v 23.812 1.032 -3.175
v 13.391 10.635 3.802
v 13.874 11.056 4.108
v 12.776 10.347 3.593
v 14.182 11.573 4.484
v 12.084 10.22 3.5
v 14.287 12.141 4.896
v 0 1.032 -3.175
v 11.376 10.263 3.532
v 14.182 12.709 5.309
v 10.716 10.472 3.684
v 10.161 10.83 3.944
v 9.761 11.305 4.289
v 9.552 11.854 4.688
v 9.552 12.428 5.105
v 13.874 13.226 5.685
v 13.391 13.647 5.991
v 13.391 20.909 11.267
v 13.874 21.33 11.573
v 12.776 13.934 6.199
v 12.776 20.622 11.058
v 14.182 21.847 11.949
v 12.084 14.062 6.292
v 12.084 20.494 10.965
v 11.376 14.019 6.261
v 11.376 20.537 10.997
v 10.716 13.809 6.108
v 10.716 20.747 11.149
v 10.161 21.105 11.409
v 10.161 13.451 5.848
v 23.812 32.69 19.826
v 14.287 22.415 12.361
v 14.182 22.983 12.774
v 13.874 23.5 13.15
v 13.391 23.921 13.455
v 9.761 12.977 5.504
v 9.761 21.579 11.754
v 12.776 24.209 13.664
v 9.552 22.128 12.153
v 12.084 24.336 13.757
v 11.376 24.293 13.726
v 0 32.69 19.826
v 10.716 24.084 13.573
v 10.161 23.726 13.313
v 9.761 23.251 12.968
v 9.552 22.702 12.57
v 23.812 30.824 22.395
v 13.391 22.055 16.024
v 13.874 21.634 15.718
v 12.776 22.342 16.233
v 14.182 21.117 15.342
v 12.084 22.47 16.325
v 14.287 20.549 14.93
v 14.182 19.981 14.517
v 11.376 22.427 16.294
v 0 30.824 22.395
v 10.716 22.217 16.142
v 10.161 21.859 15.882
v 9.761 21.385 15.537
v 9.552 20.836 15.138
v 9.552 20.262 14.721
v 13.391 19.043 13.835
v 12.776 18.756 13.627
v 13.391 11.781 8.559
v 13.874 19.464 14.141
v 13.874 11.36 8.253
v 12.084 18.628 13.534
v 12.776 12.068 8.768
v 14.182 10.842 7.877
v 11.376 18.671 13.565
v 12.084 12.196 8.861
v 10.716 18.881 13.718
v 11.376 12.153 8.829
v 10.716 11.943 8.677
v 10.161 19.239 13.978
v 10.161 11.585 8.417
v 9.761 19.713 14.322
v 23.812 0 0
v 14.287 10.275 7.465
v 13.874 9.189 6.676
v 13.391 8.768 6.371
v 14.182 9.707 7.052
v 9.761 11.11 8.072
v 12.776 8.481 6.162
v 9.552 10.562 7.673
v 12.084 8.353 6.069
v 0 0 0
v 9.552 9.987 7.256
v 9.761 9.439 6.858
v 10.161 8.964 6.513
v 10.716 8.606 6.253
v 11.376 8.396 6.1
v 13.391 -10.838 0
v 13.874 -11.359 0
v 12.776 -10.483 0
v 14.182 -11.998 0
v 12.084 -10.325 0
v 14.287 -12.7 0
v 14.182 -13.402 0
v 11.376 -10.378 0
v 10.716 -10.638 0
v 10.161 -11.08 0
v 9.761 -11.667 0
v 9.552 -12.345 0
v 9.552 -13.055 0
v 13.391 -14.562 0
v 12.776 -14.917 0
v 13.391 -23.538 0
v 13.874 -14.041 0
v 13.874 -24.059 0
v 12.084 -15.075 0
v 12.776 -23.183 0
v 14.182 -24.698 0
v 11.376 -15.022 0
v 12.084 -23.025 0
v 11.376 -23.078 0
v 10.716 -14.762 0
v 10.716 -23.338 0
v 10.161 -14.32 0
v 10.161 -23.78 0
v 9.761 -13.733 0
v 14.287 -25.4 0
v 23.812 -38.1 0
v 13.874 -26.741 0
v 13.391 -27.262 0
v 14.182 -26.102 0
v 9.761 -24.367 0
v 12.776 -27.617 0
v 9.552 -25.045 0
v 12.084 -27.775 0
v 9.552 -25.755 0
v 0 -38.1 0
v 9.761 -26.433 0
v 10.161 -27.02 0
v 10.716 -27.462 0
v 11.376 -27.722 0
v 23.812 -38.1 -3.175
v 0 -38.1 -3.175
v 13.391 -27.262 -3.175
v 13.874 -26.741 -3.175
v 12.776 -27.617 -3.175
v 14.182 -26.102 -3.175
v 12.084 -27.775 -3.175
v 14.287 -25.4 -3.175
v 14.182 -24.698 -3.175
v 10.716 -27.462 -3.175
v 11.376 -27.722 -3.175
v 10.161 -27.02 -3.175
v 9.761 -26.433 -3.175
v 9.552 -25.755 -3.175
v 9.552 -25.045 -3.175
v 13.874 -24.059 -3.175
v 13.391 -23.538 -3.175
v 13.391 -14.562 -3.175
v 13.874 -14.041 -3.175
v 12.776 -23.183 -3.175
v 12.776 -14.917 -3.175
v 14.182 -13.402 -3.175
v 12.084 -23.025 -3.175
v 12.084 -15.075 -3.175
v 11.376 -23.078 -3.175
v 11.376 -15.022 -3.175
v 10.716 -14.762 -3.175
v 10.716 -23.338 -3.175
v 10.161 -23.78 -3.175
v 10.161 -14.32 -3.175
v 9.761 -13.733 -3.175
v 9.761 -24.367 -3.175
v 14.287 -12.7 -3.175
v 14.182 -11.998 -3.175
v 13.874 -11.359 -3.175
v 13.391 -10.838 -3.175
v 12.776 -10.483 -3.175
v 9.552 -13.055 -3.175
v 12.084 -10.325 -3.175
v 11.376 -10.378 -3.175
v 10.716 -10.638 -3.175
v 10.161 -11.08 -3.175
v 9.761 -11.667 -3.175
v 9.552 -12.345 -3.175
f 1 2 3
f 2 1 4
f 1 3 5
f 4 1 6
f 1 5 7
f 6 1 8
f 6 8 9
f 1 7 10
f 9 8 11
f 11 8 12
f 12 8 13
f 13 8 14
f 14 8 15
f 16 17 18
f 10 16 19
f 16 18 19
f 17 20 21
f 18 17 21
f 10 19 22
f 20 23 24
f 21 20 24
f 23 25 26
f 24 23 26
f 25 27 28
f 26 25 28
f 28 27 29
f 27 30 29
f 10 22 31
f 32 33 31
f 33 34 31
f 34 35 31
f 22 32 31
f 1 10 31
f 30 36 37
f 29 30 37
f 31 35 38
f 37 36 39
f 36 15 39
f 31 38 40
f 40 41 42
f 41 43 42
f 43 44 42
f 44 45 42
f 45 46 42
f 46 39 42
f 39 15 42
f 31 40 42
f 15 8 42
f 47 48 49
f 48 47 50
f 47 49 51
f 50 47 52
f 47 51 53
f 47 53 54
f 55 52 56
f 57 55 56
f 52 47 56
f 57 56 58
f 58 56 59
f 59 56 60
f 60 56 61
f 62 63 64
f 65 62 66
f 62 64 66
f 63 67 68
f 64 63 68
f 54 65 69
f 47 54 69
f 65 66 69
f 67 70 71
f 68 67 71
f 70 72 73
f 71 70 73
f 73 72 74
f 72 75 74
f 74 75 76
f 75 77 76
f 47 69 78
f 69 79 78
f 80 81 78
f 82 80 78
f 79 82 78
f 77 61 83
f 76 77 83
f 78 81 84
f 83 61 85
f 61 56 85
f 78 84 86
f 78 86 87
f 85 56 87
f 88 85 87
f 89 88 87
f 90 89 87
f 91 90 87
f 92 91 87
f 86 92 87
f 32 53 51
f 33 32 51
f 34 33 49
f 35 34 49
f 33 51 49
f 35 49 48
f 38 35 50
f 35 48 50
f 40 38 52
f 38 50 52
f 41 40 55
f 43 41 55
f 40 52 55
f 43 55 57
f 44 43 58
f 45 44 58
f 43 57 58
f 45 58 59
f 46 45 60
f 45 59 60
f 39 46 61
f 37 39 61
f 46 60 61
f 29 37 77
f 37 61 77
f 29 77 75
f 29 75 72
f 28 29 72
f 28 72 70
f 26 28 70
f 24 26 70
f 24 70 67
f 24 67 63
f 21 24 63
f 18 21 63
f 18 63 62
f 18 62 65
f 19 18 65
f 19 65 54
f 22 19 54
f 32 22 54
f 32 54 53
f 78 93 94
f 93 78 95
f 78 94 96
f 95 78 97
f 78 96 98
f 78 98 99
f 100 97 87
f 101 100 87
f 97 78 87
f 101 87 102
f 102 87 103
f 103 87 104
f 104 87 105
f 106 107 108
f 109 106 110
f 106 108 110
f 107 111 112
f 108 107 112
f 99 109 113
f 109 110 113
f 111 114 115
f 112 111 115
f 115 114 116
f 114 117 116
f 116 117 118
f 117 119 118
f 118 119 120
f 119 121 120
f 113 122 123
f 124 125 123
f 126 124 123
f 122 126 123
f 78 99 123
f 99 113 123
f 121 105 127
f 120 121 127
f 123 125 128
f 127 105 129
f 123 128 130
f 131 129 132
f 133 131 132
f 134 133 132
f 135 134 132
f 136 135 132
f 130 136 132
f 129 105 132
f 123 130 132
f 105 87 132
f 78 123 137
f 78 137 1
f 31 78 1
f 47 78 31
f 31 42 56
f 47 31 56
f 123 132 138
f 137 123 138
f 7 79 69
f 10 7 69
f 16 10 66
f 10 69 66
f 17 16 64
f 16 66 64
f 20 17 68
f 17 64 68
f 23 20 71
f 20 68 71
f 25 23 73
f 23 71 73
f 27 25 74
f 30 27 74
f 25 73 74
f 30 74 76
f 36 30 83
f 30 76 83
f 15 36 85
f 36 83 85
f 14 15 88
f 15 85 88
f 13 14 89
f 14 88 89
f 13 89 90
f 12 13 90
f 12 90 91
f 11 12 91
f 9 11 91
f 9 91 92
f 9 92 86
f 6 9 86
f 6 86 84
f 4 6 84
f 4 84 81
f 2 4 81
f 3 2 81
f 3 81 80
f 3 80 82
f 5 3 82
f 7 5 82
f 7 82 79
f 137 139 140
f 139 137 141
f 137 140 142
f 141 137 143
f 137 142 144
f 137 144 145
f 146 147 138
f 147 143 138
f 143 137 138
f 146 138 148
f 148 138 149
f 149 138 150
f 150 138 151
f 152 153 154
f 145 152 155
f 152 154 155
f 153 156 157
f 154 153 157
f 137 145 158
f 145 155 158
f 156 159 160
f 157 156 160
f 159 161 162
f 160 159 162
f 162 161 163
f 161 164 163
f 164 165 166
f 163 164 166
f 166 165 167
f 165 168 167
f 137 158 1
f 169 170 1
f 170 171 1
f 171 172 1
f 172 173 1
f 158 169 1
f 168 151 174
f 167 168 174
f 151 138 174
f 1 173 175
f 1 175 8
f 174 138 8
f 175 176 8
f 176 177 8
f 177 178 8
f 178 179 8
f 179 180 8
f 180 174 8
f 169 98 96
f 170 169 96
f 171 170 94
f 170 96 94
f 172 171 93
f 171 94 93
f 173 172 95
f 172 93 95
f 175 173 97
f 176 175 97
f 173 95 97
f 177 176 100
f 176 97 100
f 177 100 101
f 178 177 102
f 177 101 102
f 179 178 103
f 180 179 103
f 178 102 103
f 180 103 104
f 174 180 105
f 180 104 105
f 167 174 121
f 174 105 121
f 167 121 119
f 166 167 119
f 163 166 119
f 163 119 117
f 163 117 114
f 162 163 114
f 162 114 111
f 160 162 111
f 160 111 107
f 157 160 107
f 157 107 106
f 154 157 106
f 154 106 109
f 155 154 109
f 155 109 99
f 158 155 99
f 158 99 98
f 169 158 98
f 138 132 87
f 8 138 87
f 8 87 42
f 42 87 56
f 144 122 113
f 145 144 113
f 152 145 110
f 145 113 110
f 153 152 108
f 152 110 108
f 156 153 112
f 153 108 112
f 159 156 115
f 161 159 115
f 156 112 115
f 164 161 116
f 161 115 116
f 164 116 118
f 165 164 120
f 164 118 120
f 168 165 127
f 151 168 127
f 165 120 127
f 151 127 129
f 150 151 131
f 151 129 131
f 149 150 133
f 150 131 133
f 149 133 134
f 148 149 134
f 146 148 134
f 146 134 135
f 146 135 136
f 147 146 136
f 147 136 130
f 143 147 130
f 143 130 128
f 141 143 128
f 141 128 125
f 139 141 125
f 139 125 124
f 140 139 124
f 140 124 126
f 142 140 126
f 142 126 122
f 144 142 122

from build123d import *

# Parameters (mm, degrees)
F1_DEPTH = 23.8125
F3_DEPTH = 25.4
F5_DEPTH = 25.4


with BuildPart() as f1:
    # F0 (on Right) → F1 (new body)
    with BuildSketch(Plane.YZ):
        Polygon((30.8235474857, 22.3946181123), (0, 0), (-38.1, 0), (-38.1, -3.175), (1.0316200355, -3.175), (32.6897656617, 19.8259891552), align=None)
    extrude(amount=F1_DEPTH)

    # F2 (on face) → F3 (cut)
    with BuildSketch(Plane.XY):
        with BuildLine():
            ThreePointArc((11.90625, -23.01875), (9.525, -25.4), (11.90625, -27.78125))
            Line((11.90625, -27.78125), (11.90625, -23.01875))
        make_face()
        with BuildLine():
            ThreePointArc((11.90625, -10.31875), (9.525, -12.7), (11.90625, -15.08125))
            Line((11.90625, -15.08125), (11.90625, -10.31875))
        make_face()
        with BuildLine():
            Line((11.90625, -10.31875), (11.90625, -15.08125))
            ThreePointArc((11.90625, -15.08125), (13.5900480227, -14.3837980227), (14.2875, -12.7))
            ThreePointArc((14.2875, -12.7), (13.5900480227, -11.0162019773), (11.90625, -10.31875))
        make_face()
        with BuildLine():
            Line((11.90625, -23.01875), (11.90625, -27.78125))
            ThreePointArc((11.90625, -27.78125), (13.5900480227, -27.0837980227), (14.2875, -25.4))
            ThreePointArc((14.2875, -25.4), (13.5900480227, -23.7162019773), (11.90625, -23.01875))
        make_face()
    extrude(amount=-F3_DEPTH, mode=Mode.SUBTRACT)

    # F4 (on face) → F5 (cut)
    with BuildSketch(Plane(origin=(0, 0, 0), x_dir=(1, 0, 0), z_dir=(0, -0.5877852523, 0.8090169944))):
        with BuildLine():
            ThreePointArc((11.90625, 15.08125), (9.525, 12.7), (11.90625, 10.31875))
            Line((11.90625, 10.31875), (11.90625, 15.08125))
        make_face()
        with BuildLine():
            ThreePointArc((11.90625, 27.78125), (9.525, 25.4), (11.90625, 23.01875))
            Line((11.90625, 23.01875), (11.90625, 27.78125))
        make_face()
        with BuildLine():
            Line((11.90625, 27.78125), (11.90625, 23.01875))
            ThreePointArc((11.90625, 23.01875), (13.5900480227, 23.7162019773), (14.2875, 25.4))
            ThreePointArc((14.2875, 25.4), (13.5900480227, 27.0837980227), (11.90625, 27.78125))
        make_face()
        with BuildLine():
            Line((11.90625, 15.08125), (11.90625, 10.31875))
            ThreePointArc((11.90625, 10.31875), (13.5900480227, 11.0162019773), (14.2875, 12.7))
            ThreePointArc((14.2875, 12.7), (13.5900480227, 14.3837980227), (11.90625, 15.08125))
        make_face()
    extrude(amount=-F5_DEPTH, mode=Mode.SUBTRACT)


solid = f1.part
